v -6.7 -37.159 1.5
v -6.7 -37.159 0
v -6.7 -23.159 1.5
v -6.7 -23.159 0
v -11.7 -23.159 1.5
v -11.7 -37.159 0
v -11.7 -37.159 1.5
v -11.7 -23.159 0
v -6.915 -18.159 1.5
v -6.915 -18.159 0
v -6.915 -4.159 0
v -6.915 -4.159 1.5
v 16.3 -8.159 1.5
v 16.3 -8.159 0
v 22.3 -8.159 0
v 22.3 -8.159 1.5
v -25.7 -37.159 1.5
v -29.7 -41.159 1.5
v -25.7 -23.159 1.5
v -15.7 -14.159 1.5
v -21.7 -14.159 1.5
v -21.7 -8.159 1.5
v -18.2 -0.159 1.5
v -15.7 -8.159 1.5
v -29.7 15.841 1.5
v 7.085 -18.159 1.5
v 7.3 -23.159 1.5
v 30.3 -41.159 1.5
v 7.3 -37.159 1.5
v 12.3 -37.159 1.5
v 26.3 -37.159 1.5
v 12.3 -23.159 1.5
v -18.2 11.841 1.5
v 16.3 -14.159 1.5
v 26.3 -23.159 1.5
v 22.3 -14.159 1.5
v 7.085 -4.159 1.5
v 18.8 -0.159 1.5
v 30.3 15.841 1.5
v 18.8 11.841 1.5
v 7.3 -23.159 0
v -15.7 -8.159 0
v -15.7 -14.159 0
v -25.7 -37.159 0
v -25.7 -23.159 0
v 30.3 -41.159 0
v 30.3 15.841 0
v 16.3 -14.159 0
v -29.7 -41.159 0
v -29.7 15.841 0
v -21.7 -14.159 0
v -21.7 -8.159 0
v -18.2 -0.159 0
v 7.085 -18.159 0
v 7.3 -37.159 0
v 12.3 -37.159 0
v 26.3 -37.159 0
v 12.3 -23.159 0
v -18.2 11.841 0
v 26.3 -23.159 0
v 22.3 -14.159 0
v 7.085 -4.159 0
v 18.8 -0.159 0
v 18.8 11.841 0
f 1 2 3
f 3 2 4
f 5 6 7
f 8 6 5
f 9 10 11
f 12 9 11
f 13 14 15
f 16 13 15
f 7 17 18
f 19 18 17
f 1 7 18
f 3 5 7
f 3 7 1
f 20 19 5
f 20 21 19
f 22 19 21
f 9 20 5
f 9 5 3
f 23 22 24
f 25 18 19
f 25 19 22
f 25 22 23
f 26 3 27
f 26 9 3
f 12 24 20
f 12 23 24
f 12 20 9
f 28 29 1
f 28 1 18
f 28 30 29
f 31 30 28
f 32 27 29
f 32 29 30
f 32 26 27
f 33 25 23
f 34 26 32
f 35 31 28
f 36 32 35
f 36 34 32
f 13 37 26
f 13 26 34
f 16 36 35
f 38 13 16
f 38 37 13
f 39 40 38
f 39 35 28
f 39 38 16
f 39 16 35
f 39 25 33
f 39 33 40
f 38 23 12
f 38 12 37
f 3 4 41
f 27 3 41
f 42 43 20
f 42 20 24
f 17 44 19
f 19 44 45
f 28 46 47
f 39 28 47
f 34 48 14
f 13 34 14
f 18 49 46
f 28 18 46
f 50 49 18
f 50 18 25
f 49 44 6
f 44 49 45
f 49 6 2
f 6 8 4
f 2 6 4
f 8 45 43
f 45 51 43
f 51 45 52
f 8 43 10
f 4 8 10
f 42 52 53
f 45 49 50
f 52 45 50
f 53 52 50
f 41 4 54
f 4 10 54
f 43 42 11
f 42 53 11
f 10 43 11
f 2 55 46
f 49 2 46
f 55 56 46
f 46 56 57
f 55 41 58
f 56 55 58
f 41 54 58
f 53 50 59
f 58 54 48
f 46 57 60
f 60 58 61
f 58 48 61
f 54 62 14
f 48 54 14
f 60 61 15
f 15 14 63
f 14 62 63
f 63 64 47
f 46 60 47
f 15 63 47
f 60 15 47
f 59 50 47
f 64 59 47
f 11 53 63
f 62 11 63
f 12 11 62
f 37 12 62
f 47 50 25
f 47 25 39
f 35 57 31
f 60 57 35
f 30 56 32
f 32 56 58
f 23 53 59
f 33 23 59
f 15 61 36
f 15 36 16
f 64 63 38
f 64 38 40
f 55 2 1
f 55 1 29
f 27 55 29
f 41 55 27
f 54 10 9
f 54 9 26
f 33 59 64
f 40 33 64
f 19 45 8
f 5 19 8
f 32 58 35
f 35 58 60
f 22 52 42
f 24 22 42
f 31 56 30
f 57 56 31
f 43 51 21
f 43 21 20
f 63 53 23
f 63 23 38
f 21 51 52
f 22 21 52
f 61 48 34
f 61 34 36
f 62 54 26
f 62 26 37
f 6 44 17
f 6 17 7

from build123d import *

# Parameters (mm, degrees)
SKETCH1_W           = 60
SKETCH1_H           = 57
SKETCH1_W_2         = 14
SKETCH1_H_2         = 14
SKETCH1_W_3         = 37
SKETCH1_H_3         = 12
SKETCH1_W_4         = 6
SKETCH1_H_4         = 6
BOSS_EXTRUDE1_DEPTH = 1.5


with BuildPart() as part:
    # Sketch1 → Boss-Extrude1 (new body)
    with BuildSketch(Plane.XY):
        with Locations((0.299968287, -12.658536585)):
            Rectangle(SKETCH1_W, SKETCH1_H)
        with Locations((-18.700031713, -30.158536585)):
            Rectangle(SKETCH1_W_2, SKETCH1_H_2, mode=Mode.SUBTRACT)
        with Locations((0.299968287, -30.158536585)):
            Rectangle(SKETCH1_W_2, SKETCH1_H_2, mode=Mode.SUBTRACT)
        with Locations((19.299968287, -30.158536585)):
            Rectangle(SKETCH1_W_2, SKETCH1_H_2, mode=Mode.SUBTRACT)
        with Locations((0.085273165, -11.158536585)):
            Rectangle(SKETCH1_W_2, SKETCH1_H_2, mode=Mode.SUBTRACT)
        with Locations((0.299968287, 5.841463415)):
            Rectangle(SKETCH1_W_3, SKETCH1_H_3, mode=Mode.SUBTRACT)
        with Locations((-18.700031713, -11.158536585)):
            Rectangle(SKETCH1_W_4, SKETCH1_H_4, mode=Mode.SUBTRACT)
        with Locations((19.299968287, -11.158536585)):
            Rectangle(SKETCH1_W_4, SKETCH1_H_4, mode=Mode.SUBTRACT)
    extrude(amount=BOSS_EXTRUDE1_DEPTH)


solid = part.part
